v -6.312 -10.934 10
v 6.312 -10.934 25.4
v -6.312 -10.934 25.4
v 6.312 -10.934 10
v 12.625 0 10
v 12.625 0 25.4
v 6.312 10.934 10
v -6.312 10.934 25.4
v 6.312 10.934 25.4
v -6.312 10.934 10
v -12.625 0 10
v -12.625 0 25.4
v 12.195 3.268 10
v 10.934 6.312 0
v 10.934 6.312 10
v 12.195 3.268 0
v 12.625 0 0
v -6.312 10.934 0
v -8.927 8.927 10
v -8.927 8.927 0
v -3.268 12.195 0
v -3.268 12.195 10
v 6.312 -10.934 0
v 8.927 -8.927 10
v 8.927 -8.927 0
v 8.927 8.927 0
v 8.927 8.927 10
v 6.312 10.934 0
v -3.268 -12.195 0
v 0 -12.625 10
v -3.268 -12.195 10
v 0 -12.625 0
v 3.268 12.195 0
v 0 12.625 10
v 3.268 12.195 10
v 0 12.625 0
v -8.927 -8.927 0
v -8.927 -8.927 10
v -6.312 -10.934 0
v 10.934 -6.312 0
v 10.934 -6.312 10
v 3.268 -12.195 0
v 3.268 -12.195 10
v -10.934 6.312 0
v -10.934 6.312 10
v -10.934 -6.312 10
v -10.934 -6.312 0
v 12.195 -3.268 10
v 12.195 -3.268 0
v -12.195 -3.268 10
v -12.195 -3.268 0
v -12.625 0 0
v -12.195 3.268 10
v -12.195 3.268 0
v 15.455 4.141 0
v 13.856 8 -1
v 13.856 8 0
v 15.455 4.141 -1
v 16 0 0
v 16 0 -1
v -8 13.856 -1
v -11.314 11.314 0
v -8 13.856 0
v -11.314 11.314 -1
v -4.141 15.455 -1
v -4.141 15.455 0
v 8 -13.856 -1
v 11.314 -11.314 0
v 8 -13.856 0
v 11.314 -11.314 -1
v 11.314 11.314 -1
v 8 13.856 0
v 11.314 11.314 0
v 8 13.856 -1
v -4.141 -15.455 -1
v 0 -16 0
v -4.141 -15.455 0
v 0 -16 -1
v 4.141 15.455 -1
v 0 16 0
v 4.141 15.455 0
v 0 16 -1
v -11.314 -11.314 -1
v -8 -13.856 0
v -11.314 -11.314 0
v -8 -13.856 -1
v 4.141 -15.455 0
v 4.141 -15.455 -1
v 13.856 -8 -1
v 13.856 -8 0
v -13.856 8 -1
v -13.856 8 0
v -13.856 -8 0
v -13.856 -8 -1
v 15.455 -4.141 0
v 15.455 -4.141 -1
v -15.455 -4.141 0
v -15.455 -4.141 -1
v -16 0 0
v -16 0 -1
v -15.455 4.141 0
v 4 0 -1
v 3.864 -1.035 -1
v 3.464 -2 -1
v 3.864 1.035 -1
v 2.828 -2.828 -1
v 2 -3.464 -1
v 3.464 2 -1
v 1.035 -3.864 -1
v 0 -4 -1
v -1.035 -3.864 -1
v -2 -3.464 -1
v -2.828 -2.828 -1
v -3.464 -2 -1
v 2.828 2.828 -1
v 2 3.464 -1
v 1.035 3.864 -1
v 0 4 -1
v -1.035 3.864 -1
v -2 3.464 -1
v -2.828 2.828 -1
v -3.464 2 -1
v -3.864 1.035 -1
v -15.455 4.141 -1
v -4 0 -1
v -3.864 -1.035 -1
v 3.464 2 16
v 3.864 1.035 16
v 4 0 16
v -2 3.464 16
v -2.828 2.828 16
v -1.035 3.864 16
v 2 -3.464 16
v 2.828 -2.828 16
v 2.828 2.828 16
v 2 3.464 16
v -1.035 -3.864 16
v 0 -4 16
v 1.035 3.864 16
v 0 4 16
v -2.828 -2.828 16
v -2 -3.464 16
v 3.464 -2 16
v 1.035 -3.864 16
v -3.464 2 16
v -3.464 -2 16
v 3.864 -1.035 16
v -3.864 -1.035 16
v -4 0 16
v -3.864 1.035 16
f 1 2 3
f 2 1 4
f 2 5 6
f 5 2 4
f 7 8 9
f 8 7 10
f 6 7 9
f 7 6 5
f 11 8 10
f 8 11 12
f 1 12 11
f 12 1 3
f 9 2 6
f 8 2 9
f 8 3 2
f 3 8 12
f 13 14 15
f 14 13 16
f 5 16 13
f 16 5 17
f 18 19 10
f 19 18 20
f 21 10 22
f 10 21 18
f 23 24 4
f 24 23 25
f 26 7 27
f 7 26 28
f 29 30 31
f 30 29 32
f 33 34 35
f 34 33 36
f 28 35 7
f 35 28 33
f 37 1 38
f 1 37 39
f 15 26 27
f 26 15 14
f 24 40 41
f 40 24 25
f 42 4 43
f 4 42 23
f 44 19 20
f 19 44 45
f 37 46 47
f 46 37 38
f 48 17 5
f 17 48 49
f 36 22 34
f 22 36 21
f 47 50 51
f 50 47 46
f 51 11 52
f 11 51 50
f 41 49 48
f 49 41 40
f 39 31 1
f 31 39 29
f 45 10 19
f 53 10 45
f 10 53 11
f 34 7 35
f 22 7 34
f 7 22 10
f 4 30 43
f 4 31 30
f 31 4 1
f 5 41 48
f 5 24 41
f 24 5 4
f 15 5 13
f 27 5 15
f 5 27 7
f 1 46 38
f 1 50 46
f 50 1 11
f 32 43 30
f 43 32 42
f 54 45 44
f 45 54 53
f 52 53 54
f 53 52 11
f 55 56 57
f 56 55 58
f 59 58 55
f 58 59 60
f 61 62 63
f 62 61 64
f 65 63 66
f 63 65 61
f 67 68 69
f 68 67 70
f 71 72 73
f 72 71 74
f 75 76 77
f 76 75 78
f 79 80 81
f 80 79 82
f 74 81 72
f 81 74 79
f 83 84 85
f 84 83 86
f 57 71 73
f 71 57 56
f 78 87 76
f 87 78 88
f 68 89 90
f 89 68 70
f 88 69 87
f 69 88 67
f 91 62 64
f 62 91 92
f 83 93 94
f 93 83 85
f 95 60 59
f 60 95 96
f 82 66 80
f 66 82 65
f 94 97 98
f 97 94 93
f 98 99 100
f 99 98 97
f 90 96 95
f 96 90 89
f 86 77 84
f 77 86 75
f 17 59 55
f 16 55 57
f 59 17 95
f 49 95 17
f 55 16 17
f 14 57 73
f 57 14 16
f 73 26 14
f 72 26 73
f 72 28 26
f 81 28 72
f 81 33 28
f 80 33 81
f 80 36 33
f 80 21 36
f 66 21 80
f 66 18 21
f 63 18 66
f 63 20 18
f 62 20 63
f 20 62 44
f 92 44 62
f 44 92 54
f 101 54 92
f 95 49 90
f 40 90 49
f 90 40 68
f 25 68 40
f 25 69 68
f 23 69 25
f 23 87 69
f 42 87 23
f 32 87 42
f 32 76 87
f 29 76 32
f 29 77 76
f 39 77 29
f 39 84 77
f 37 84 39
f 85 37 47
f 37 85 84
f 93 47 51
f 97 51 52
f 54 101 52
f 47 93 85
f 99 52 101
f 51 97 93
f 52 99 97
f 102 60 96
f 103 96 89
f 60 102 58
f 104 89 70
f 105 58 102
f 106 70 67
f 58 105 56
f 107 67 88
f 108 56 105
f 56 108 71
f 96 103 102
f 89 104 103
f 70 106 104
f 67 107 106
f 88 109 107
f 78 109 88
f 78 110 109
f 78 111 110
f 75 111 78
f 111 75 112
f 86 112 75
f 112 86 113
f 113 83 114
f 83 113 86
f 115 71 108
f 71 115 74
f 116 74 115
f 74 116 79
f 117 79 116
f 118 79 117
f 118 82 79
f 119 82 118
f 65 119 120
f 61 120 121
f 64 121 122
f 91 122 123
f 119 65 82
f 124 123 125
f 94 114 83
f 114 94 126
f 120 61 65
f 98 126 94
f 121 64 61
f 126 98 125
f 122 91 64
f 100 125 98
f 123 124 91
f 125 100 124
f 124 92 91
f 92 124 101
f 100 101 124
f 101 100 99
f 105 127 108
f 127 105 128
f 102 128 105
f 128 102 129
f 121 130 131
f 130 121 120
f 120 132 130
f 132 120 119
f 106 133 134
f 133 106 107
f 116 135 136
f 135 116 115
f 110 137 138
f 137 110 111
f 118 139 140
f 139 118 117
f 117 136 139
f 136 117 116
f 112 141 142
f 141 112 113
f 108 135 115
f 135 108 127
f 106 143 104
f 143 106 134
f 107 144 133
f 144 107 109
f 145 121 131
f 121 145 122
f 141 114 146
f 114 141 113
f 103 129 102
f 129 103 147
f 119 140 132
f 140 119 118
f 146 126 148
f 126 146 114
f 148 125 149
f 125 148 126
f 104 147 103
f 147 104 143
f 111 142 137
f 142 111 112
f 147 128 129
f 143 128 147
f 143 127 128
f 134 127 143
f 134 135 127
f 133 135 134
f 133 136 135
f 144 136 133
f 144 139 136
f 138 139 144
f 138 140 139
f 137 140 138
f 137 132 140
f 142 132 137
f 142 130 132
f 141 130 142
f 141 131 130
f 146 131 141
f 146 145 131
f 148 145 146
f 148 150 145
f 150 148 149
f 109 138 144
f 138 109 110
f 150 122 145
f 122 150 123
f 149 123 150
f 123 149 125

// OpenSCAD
module Stand
(
	height1=25.4,
	height2=10,
	diam1=25.25,
	diam2=8,
	height2i=16,
	diam3=32,
	height3=1,
	quality=2,
)
{
	clr=0.1;
	difference()
	{
		union()
		{
			translate([0,0,-clr])
				cylinder(h=height1+clr,d=diam1,$fn=6);
			translate([0,0,-clr])
				cylinder(h=height2+clr,d=diam1,$fn=12*quality);
			translate([0,0,-height3])
				cylinder(h=height3,d=diam3,$fn=12*quality);
		}
		translate([0,0,-clr-height3])
			cylinder(h=height2i+height3+clr,d=diam2,$fn=12*quality);
	}
}

Stand();
